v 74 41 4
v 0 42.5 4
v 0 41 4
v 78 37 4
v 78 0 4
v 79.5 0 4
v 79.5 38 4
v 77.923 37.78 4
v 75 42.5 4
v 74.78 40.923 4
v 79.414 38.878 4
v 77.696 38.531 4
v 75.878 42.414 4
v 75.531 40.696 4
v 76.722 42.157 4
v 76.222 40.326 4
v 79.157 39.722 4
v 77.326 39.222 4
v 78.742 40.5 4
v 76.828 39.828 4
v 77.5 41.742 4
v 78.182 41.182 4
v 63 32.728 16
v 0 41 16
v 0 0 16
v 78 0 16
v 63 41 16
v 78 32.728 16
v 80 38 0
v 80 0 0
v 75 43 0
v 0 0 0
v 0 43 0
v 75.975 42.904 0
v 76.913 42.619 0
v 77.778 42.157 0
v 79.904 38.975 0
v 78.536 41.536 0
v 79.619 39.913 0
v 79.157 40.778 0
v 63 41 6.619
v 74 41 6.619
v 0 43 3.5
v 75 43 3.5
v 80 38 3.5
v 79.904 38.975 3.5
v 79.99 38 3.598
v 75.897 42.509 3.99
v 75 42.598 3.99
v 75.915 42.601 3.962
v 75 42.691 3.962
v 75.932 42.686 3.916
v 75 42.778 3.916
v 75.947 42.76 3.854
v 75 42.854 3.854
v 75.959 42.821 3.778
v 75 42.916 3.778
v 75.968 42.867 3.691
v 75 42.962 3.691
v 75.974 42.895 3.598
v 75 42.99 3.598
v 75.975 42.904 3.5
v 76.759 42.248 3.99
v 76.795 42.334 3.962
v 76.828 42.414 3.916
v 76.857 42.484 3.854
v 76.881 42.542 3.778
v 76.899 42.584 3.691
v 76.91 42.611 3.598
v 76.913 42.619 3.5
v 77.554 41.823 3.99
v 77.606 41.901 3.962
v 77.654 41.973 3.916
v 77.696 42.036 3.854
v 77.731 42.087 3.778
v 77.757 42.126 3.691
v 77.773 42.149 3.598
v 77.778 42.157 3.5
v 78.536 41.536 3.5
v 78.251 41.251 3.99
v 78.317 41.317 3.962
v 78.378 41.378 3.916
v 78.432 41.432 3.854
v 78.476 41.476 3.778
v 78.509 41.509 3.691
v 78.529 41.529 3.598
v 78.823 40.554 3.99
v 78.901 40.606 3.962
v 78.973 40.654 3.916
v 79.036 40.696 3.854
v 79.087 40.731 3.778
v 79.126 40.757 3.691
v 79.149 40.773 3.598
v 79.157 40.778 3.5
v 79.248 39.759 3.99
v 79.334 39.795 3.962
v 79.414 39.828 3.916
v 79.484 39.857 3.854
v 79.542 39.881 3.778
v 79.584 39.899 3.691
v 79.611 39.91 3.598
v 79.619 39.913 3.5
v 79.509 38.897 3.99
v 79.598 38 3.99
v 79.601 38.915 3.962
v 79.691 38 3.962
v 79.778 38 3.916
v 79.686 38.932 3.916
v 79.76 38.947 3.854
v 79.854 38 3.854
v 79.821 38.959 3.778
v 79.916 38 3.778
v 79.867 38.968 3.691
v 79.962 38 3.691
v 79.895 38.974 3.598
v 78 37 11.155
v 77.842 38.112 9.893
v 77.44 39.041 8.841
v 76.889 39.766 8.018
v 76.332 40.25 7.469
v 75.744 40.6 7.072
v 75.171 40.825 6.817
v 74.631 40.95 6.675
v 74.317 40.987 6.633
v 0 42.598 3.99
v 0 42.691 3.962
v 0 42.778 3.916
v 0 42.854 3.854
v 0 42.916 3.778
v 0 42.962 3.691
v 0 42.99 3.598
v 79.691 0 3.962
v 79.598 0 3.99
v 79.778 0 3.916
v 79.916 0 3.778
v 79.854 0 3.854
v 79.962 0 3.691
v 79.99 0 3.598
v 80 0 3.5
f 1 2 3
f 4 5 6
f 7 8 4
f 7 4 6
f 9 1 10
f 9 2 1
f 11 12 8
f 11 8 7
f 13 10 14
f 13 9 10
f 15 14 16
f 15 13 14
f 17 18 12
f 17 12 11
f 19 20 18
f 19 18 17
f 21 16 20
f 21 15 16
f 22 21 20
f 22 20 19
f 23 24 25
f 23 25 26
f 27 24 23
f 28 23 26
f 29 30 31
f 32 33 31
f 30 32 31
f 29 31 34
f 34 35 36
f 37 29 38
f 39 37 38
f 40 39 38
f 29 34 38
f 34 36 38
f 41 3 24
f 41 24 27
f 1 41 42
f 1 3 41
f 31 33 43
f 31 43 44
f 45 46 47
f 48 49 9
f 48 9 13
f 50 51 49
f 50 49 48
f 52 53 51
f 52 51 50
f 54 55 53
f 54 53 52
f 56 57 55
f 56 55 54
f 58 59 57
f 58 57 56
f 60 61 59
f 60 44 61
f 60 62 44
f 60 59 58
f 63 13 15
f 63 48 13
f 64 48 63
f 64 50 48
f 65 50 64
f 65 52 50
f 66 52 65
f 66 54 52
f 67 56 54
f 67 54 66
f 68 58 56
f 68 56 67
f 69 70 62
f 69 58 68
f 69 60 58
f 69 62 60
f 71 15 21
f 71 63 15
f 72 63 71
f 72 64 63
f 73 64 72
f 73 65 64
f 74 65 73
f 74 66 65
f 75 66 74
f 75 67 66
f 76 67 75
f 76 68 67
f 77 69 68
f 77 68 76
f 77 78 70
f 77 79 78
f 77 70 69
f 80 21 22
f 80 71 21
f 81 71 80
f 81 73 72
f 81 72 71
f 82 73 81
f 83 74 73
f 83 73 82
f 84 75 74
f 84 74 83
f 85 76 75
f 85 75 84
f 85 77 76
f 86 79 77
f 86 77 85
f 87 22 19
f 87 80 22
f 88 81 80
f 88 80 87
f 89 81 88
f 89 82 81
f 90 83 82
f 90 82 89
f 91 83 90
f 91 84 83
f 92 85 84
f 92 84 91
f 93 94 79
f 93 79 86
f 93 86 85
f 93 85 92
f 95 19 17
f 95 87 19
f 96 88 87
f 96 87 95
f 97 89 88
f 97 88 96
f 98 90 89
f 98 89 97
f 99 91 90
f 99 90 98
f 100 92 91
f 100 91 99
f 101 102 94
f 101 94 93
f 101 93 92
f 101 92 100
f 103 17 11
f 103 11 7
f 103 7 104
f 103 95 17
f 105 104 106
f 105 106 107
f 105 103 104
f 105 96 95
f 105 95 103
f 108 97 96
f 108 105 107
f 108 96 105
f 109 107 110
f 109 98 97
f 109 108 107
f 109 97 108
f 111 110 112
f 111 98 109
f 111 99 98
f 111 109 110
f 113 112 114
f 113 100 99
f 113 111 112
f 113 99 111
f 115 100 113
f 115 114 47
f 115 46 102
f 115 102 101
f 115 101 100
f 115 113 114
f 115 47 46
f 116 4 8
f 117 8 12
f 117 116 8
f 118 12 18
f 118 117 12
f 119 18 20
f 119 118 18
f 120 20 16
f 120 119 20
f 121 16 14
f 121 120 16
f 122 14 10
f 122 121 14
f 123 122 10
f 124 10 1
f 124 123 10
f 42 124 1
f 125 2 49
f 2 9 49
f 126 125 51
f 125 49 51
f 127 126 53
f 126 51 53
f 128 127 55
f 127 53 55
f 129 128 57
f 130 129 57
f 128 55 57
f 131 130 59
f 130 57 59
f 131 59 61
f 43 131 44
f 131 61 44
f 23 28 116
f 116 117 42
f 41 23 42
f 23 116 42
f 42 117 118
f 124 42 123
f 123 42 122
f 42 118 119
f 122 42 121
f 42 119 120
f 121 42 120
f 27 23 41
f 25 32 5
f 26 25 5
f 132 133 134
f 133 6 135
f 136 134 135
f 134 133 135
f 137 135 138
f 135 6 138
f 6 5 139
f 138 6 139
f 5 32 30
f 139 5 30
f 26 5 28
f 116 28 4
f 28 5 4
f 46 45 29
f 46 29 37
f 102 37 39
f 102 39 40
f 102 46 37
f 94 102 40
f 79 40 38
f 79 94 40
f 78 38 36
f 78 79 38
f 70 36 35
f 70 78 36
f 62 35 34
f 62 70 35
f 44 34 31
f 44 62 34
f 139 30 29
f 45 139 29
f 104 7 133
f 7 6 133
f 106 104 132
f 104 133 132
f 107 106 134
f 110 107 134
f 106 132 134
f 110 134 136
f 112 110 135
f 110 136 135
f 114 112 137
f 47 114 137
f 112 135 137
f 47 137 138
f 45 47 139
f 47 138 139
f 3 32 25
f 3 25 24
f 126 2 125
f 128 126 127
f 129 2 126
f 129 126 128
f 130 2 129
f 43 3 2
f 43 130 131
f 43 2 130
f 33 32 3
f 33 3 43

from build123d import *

# Parameters (mm, degrees)
F0_W     = 80
F0_H     = 43
F1_DEPTH = 4
F2_W     = 78
F2_H     = 41
F3_DEPTH = 12
F4_R     = 5
F5_R     = 0.5
F7_DEPTH = 15
F8_R     = 4


# Not quite as in the source:
# - a feature of the source that left no trace in its solid (it failed there, or was rolled back) is left out


with BuildPart() as f1:
    # F0 (on Top) → F1 (new body)
    with BuildSketch(Plane.XY):
        with Locations((40, 21.5)):
            Rectangle(F0_W, F0_H)
    extrude(amount=F1_DEPTH)

    # F2 (on face) → F3 (join)
    with BuildSketch(Plane.XY.offset(4)):
        with Locations((39, 20.5)):
            Rectangle(F2_W, F2_H)
    extrude(amount=F3_DEPTH)

    # F4
    f4_edges = [f1.edges().sort_by_distance(p)[0] for p in [
        (80, 43, 2),
    ]]
    fillet(f4_edges, radius=F4_R)

    # F5
    f5_edges = [f1.edges().sort_by_distance(p)[0] for p in [
        (37.5, 43, 4),
        (78.535534, 41.535534, 4),
        (80, 19, 4),
    ]]
    fillet(f5_edges, radius=F5_R)

    # F6 (on face) → F7 (cut)
    with BuildSketch(Plane.YZ.offset(78)):
        Polygon((41, 16), (32.7275320888, 16), (41, 6.6185845062), align=None)
    extrude(amount=-F7_DEPTH, mode=Mode.SUBTRACT)

    # F8
    f8_edges = [f1.edges().sort_by_distance(p)[0] for p in [
        (78, 41, 5.309292),
    ]]
    fillet(f8_edges, radius=F8_R)


solid = f1.part
